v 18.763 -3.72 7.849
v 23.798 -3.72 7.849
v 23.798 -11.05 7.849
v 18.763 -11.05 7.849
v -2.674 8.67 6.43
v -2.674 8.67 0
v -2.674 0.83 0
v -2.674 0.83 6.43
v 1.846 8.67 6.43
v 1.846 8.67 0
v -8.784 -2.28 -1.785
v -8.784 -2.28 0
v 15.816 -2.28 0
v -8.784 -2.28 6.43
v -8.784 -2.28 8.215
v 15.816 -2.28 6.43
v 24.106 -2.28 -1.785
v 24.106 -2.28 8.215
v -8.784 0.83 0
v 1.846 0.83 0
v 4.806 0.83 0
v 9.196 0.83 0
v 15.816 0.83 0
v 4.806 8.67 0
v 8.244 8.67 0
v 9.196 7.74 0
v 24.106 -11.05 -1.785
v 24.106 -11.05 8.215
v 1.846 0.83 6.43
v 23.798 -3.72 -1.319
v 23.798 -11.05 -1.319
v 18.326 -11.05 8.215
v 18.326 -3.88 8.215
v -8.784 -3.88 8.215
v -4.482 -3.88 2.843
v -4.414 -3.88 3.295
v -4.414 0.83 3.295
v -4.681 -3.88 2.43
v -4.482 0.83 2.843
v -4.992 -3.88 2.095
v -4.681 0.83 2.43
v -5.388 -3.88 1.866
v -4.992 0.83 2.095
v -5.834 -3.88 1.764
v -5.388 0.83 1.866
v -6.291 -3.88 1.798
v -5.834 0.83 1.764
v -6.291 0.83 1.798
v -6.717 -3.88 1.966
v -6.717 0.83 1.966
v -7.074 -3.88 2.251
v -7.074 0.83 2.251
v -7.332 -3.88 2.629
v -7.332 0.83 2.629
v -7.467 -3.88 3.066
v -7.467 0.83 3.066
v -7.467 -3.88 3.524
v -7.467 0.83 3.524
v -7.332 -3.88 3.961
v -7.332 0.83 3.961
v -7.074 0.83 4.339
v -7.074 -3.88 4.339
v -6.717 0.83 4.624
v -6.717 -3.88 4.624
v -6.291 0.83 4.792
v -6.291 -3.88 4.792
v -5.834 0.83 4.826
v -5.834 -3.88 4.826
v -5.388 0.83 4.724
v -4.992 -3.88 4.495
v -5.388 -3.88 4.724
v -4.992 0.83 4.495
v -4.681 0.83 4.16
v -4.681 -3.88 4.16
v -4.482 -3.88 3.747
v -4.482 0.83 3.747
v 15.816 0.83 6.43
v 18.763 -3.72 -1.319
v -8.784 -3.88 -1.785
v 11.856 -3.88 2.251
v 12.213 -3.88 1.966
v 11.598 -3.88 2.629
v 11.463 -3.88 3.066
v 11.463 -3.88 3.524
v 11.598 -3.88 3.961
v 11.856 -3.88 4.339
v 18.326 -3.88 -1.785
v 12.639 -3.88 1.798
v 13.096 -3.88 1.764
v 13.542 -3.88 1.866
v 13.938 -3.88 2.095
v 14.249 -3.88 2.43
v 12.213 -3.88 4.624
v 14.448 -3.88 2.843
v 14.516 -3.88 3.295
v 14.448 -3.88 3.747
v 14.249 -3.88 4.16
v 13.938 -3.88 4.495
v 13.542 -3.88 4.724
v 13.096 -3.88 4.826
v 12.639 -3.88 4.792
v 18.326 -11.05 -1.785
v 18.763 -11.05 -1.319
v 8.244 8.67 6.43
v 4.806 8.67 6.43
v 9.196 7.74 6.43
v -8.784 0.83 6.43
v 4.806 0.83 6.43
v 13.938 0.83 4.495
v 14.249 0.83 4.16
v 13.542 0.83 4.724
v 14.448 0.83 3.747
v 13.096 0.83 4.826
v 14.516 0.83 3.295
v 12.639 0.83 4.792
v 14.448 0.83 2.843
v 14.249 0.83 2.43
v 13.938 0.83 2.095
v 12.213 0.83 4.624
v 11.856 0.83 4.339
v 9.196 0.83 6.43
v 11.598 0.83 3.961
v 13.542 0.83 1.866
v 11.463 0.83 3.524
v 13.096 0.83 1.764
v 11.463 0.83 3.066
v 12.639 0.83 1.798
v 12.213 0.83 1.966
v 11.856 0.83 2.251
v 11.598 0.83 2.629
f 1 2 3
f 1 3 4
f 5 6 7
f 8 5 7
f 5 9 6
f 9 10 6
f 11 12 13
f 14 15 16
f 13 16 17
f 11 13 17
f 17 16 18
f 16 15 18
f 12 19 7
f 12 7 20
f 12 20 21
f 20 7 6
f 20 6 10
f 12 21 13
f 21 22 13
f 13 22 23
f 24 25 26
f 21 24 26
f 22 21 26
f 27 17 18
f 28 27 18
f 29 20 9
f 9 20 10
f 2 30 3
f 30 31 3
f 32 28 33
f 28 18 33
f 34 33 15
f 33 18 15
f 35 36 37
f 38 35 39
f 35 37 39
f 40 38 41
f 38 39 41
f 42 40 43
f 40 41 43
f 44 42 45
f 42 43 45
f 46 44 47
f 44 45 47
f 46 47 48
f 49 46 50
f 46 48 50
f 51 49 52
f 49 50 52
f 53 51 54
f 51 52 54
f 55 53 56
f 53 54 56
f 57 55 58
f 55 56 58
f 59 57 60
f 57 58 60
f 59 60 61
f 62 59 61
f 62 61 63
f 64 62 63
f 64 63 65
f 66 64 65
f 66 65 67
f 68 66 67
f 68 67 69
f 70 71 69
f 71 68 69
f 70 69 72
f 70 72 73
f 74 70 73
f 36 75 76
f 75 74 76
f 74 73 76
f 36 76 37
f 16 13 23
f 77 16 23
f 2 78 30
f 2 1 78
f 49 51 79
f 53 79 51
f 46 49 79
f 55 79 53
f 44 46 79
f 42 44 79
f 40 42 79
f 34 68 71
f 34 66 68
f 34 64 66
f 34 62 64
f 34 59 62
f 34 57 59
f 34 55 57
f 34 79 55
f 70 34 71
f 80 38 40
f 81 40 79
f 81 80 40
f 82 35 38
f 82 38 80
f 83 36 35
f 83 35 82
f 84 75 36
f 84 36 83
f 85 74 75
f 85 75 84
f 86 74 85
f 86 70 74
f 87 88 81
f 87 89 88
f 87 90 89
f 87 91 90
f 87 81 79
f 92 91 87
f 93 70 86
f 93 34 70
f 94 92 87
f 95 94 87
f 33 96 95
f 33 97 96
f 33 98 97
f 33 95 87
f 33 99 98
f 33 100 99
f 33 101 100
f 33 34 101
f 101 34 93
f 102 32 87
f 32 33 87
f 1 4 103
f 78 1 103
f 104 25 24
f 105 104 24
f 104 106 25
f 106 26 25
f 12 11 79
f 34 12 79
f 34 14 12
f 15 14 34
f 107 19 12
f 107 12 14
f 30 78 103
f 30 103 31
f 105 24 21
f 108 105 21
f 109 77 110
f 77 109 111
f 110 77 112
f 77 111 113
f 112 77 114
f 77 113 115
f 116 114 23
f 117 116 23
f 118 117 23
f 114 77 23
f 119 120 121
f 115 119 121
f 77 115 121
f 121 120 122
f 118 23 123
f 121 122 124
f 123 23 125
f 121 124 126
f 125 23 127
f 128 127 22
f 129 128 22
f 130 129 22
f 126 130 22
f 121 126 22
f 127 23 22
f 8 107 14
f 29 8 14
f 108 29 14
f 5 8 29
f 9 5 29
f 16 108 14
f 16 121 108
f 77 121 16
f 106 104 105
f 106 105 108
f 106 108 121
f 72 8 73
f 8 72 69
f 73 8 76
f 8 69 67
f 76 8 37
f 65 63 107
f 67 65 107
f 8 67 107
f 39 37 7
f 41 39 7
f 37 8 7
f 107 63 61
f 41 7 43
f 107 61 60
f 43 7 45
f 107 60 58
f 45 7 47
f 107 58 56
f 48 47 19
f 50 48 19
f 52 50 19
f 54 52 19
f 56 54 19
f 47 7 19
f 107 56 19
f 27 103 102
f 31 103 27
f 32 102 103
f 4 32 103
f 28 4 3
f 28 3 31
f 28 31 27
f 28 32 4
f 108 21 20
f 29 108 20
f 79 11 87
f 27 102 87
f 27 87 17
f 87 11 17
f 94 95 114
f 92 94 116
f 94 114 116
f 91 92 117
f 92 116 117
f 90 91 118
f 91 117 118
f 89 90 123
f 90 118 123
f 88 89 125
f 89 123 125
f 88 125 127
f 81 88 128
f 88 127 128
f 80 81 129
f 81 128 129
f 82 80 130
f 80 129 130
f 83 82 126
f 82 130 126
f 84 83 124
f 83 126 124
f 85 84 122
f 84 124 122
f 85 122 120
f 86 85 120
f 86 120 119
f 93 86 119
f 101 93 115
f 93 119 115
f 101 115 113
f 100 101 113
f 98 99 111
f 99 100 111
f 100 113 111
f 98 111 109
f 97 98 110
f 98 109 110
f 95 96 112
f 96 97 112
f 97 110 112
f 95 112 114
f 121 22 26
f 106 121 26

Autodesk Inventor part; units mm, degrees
ref_plane "YZ Plane" through (0, 0, 0) normal (1, 0, 0) x (0, 1, 0)
ref_plane "XZ Plane" through (0, 0, 0) normal (0, 1, 0) x (-1, 0, 0)
ref_plane "XY Plane" through (0, 0, 0) normal (0, 0, 1) x (1, 0, 0)
sketch "Sketch1" plane through (0, 0, 0) normal (0, 0, 1) x (1, 0, 0)
  line L0 (-8.7842, -2.2796) -> (15.8158, -2.2796)
  line L1 (15.8158, -2.2796) -> (15.8158, 0.8304)
  line L2 (15.8158, 0.8304) -> (9.1958, 0.8304)
  line L3 (9.1958, 0.8304) -> (9.1958, 7.7401)
  line L4 (9.1958, 7.7401) -> (8.2439, 8.6704)
  line L5 (8.2439, 8.6704) -> (4.8058, 8.6704)
  line L6 (4.8058, 8.6704) -> (4.8058, 0.8304)
  line L7 (4.8058, 0.8304) -> (1.8458, 0.8304)
  line L8 (1.8458, 0.8304) -> (1.8458, 8.6704)
  line L9 (1.8458, 8.6704) -> (-2.6742, 8.6704)
  line L10 (-2.6742, 8.6704) -> (-2.6742, 0.8304)
  line L11 (-2.6742, 0.8304) -> (-8.7842, 0.8304)
  line L12 (-8.7842, 0.8304) -> (-8.7842, -2.2796)
  point P0 (0, 0)
  dimension "d0" = 24.6
  dimension "d1" = 3.11
  dimension "d2" = 4.39
  dimension "d3" = 2.96
  dimension "d4" = 4.52
  dimension "d5" = 6.62
  dimension "d6" = 7.84
extrude "Extrusion1" add sketch "Sketch1" along normal blind 6.43
sketch "Sketch2" plane through (9.1958, 0.8304, 0) normal (0, 1, 0) x (1, 0, 0)
  line L0 (6.62, 0) -> (0, 0) projected
  line L1 (6.62, -6.43) -> (0, -6.43) projected
  line L2 (6.62, 0) -> (6.62, -6.43) construction
  line L3 (6.62, -4.83) -> (-18.0124, -4.83) construction
  line L4 (-18.0124, -1.76) -> (6.62, -1.76) construction
  line L5 (-17.98, 0) -> (-17.98, -6.43) construction
  line L6 (-11.87, 0) -> (-17.98, 0) construction
  line L7 (-11.87, -6.43) -> (-17.98, -6.43) construction
  line L8 (-16.68, -6.43) -> (-16.68, 0) construction
  circle A0 centre (-15.145, -3.295) radius 1.535
  line L9 (5.32, 0) -> (5.32, -6.43) construction
  circle A1 centre (3.785, -3.295) radius 1.535
  point P0 (-9.1958, 0)
  dimension "d9" = 1.76
  dimension "d10" = 1.6
  dimension "d11" = 1.3
  dimension "d12" = 1.3
extrude "Extrusion2" cut sketch "Sketch2" along normal up to surface (3.11 mm away) from surface at -3.11
sketch "Sketch3" plane through (-8.7842, -2.2796, 0) normal (0, -1, 0) x (1, 0, 0)
  circle A0 centre (2.835, 3.295) radius 1.535 projected
  circle A1 centre (21.765, 3.295) radius 1.535 projected
  line L0 (0, 0) -> (0, 6.43) projected
  line L1 (0, -1.785) -> (32.89, -1.785)
  line L2 (32.89, -1.785) -> (32.89, 8.215)
  line L3 (32.89, 8.215) -> (0, 8.215)
  line L4 (0, 8.215) -> (0, -1.785)
  line L5 (0, 3.215) -> (32.89, 3.215) construction
  point P0 (8.7842, 0)
  dimension "d15" = 32.89
  dimension "d16" = 10
extrude "Extrusion3" add sketch "Sketch3" along normal blind 1.6
sketch "Sketch4" plane through (-8.7842, -3.8796, 0) normal (0, -1, 0) x (1, 0, 0)
  line L0 (0, -1.785) -> (32.89, -1.785) projected
  line L1 (32.89, 8.215) -> (27.11, 8.215)
  line L2 (27.11, 8.215) -> (27.11, -1.785)
  line L3 (27.11, -1.785) -> (32.89, -1.785)
  line L4 (32.89, -1.785) -> (32.89, 8.215)
  point P0 (8.7842, 0)
  dimension "d19" = 5.78
extrude "Extrusion4" add sketch "Sketch4" along normal blind 7.17
sketch "Sketch5" plane through (-8.7842, -11.0496, 0) normal (0, -1, 0) x (1, 0, 0)
  line L0 (27.5471, -1.3186) -> (32.5822, -1.3186)
  line L1 (32.5822, -1.3186) -> (32.5822, 7.8489)
  line L2 (32.5822, 7.8489) -> (27.5471, 7.8489)
  line L3 (27.5471, 7.8489) -> (27.5471, -1.3186)
  point P0 (8.7842, 0)
extrude "Extrusion5" cut sketch "Sketch5" against normal blind 7.33
properties part number "optical stop"
